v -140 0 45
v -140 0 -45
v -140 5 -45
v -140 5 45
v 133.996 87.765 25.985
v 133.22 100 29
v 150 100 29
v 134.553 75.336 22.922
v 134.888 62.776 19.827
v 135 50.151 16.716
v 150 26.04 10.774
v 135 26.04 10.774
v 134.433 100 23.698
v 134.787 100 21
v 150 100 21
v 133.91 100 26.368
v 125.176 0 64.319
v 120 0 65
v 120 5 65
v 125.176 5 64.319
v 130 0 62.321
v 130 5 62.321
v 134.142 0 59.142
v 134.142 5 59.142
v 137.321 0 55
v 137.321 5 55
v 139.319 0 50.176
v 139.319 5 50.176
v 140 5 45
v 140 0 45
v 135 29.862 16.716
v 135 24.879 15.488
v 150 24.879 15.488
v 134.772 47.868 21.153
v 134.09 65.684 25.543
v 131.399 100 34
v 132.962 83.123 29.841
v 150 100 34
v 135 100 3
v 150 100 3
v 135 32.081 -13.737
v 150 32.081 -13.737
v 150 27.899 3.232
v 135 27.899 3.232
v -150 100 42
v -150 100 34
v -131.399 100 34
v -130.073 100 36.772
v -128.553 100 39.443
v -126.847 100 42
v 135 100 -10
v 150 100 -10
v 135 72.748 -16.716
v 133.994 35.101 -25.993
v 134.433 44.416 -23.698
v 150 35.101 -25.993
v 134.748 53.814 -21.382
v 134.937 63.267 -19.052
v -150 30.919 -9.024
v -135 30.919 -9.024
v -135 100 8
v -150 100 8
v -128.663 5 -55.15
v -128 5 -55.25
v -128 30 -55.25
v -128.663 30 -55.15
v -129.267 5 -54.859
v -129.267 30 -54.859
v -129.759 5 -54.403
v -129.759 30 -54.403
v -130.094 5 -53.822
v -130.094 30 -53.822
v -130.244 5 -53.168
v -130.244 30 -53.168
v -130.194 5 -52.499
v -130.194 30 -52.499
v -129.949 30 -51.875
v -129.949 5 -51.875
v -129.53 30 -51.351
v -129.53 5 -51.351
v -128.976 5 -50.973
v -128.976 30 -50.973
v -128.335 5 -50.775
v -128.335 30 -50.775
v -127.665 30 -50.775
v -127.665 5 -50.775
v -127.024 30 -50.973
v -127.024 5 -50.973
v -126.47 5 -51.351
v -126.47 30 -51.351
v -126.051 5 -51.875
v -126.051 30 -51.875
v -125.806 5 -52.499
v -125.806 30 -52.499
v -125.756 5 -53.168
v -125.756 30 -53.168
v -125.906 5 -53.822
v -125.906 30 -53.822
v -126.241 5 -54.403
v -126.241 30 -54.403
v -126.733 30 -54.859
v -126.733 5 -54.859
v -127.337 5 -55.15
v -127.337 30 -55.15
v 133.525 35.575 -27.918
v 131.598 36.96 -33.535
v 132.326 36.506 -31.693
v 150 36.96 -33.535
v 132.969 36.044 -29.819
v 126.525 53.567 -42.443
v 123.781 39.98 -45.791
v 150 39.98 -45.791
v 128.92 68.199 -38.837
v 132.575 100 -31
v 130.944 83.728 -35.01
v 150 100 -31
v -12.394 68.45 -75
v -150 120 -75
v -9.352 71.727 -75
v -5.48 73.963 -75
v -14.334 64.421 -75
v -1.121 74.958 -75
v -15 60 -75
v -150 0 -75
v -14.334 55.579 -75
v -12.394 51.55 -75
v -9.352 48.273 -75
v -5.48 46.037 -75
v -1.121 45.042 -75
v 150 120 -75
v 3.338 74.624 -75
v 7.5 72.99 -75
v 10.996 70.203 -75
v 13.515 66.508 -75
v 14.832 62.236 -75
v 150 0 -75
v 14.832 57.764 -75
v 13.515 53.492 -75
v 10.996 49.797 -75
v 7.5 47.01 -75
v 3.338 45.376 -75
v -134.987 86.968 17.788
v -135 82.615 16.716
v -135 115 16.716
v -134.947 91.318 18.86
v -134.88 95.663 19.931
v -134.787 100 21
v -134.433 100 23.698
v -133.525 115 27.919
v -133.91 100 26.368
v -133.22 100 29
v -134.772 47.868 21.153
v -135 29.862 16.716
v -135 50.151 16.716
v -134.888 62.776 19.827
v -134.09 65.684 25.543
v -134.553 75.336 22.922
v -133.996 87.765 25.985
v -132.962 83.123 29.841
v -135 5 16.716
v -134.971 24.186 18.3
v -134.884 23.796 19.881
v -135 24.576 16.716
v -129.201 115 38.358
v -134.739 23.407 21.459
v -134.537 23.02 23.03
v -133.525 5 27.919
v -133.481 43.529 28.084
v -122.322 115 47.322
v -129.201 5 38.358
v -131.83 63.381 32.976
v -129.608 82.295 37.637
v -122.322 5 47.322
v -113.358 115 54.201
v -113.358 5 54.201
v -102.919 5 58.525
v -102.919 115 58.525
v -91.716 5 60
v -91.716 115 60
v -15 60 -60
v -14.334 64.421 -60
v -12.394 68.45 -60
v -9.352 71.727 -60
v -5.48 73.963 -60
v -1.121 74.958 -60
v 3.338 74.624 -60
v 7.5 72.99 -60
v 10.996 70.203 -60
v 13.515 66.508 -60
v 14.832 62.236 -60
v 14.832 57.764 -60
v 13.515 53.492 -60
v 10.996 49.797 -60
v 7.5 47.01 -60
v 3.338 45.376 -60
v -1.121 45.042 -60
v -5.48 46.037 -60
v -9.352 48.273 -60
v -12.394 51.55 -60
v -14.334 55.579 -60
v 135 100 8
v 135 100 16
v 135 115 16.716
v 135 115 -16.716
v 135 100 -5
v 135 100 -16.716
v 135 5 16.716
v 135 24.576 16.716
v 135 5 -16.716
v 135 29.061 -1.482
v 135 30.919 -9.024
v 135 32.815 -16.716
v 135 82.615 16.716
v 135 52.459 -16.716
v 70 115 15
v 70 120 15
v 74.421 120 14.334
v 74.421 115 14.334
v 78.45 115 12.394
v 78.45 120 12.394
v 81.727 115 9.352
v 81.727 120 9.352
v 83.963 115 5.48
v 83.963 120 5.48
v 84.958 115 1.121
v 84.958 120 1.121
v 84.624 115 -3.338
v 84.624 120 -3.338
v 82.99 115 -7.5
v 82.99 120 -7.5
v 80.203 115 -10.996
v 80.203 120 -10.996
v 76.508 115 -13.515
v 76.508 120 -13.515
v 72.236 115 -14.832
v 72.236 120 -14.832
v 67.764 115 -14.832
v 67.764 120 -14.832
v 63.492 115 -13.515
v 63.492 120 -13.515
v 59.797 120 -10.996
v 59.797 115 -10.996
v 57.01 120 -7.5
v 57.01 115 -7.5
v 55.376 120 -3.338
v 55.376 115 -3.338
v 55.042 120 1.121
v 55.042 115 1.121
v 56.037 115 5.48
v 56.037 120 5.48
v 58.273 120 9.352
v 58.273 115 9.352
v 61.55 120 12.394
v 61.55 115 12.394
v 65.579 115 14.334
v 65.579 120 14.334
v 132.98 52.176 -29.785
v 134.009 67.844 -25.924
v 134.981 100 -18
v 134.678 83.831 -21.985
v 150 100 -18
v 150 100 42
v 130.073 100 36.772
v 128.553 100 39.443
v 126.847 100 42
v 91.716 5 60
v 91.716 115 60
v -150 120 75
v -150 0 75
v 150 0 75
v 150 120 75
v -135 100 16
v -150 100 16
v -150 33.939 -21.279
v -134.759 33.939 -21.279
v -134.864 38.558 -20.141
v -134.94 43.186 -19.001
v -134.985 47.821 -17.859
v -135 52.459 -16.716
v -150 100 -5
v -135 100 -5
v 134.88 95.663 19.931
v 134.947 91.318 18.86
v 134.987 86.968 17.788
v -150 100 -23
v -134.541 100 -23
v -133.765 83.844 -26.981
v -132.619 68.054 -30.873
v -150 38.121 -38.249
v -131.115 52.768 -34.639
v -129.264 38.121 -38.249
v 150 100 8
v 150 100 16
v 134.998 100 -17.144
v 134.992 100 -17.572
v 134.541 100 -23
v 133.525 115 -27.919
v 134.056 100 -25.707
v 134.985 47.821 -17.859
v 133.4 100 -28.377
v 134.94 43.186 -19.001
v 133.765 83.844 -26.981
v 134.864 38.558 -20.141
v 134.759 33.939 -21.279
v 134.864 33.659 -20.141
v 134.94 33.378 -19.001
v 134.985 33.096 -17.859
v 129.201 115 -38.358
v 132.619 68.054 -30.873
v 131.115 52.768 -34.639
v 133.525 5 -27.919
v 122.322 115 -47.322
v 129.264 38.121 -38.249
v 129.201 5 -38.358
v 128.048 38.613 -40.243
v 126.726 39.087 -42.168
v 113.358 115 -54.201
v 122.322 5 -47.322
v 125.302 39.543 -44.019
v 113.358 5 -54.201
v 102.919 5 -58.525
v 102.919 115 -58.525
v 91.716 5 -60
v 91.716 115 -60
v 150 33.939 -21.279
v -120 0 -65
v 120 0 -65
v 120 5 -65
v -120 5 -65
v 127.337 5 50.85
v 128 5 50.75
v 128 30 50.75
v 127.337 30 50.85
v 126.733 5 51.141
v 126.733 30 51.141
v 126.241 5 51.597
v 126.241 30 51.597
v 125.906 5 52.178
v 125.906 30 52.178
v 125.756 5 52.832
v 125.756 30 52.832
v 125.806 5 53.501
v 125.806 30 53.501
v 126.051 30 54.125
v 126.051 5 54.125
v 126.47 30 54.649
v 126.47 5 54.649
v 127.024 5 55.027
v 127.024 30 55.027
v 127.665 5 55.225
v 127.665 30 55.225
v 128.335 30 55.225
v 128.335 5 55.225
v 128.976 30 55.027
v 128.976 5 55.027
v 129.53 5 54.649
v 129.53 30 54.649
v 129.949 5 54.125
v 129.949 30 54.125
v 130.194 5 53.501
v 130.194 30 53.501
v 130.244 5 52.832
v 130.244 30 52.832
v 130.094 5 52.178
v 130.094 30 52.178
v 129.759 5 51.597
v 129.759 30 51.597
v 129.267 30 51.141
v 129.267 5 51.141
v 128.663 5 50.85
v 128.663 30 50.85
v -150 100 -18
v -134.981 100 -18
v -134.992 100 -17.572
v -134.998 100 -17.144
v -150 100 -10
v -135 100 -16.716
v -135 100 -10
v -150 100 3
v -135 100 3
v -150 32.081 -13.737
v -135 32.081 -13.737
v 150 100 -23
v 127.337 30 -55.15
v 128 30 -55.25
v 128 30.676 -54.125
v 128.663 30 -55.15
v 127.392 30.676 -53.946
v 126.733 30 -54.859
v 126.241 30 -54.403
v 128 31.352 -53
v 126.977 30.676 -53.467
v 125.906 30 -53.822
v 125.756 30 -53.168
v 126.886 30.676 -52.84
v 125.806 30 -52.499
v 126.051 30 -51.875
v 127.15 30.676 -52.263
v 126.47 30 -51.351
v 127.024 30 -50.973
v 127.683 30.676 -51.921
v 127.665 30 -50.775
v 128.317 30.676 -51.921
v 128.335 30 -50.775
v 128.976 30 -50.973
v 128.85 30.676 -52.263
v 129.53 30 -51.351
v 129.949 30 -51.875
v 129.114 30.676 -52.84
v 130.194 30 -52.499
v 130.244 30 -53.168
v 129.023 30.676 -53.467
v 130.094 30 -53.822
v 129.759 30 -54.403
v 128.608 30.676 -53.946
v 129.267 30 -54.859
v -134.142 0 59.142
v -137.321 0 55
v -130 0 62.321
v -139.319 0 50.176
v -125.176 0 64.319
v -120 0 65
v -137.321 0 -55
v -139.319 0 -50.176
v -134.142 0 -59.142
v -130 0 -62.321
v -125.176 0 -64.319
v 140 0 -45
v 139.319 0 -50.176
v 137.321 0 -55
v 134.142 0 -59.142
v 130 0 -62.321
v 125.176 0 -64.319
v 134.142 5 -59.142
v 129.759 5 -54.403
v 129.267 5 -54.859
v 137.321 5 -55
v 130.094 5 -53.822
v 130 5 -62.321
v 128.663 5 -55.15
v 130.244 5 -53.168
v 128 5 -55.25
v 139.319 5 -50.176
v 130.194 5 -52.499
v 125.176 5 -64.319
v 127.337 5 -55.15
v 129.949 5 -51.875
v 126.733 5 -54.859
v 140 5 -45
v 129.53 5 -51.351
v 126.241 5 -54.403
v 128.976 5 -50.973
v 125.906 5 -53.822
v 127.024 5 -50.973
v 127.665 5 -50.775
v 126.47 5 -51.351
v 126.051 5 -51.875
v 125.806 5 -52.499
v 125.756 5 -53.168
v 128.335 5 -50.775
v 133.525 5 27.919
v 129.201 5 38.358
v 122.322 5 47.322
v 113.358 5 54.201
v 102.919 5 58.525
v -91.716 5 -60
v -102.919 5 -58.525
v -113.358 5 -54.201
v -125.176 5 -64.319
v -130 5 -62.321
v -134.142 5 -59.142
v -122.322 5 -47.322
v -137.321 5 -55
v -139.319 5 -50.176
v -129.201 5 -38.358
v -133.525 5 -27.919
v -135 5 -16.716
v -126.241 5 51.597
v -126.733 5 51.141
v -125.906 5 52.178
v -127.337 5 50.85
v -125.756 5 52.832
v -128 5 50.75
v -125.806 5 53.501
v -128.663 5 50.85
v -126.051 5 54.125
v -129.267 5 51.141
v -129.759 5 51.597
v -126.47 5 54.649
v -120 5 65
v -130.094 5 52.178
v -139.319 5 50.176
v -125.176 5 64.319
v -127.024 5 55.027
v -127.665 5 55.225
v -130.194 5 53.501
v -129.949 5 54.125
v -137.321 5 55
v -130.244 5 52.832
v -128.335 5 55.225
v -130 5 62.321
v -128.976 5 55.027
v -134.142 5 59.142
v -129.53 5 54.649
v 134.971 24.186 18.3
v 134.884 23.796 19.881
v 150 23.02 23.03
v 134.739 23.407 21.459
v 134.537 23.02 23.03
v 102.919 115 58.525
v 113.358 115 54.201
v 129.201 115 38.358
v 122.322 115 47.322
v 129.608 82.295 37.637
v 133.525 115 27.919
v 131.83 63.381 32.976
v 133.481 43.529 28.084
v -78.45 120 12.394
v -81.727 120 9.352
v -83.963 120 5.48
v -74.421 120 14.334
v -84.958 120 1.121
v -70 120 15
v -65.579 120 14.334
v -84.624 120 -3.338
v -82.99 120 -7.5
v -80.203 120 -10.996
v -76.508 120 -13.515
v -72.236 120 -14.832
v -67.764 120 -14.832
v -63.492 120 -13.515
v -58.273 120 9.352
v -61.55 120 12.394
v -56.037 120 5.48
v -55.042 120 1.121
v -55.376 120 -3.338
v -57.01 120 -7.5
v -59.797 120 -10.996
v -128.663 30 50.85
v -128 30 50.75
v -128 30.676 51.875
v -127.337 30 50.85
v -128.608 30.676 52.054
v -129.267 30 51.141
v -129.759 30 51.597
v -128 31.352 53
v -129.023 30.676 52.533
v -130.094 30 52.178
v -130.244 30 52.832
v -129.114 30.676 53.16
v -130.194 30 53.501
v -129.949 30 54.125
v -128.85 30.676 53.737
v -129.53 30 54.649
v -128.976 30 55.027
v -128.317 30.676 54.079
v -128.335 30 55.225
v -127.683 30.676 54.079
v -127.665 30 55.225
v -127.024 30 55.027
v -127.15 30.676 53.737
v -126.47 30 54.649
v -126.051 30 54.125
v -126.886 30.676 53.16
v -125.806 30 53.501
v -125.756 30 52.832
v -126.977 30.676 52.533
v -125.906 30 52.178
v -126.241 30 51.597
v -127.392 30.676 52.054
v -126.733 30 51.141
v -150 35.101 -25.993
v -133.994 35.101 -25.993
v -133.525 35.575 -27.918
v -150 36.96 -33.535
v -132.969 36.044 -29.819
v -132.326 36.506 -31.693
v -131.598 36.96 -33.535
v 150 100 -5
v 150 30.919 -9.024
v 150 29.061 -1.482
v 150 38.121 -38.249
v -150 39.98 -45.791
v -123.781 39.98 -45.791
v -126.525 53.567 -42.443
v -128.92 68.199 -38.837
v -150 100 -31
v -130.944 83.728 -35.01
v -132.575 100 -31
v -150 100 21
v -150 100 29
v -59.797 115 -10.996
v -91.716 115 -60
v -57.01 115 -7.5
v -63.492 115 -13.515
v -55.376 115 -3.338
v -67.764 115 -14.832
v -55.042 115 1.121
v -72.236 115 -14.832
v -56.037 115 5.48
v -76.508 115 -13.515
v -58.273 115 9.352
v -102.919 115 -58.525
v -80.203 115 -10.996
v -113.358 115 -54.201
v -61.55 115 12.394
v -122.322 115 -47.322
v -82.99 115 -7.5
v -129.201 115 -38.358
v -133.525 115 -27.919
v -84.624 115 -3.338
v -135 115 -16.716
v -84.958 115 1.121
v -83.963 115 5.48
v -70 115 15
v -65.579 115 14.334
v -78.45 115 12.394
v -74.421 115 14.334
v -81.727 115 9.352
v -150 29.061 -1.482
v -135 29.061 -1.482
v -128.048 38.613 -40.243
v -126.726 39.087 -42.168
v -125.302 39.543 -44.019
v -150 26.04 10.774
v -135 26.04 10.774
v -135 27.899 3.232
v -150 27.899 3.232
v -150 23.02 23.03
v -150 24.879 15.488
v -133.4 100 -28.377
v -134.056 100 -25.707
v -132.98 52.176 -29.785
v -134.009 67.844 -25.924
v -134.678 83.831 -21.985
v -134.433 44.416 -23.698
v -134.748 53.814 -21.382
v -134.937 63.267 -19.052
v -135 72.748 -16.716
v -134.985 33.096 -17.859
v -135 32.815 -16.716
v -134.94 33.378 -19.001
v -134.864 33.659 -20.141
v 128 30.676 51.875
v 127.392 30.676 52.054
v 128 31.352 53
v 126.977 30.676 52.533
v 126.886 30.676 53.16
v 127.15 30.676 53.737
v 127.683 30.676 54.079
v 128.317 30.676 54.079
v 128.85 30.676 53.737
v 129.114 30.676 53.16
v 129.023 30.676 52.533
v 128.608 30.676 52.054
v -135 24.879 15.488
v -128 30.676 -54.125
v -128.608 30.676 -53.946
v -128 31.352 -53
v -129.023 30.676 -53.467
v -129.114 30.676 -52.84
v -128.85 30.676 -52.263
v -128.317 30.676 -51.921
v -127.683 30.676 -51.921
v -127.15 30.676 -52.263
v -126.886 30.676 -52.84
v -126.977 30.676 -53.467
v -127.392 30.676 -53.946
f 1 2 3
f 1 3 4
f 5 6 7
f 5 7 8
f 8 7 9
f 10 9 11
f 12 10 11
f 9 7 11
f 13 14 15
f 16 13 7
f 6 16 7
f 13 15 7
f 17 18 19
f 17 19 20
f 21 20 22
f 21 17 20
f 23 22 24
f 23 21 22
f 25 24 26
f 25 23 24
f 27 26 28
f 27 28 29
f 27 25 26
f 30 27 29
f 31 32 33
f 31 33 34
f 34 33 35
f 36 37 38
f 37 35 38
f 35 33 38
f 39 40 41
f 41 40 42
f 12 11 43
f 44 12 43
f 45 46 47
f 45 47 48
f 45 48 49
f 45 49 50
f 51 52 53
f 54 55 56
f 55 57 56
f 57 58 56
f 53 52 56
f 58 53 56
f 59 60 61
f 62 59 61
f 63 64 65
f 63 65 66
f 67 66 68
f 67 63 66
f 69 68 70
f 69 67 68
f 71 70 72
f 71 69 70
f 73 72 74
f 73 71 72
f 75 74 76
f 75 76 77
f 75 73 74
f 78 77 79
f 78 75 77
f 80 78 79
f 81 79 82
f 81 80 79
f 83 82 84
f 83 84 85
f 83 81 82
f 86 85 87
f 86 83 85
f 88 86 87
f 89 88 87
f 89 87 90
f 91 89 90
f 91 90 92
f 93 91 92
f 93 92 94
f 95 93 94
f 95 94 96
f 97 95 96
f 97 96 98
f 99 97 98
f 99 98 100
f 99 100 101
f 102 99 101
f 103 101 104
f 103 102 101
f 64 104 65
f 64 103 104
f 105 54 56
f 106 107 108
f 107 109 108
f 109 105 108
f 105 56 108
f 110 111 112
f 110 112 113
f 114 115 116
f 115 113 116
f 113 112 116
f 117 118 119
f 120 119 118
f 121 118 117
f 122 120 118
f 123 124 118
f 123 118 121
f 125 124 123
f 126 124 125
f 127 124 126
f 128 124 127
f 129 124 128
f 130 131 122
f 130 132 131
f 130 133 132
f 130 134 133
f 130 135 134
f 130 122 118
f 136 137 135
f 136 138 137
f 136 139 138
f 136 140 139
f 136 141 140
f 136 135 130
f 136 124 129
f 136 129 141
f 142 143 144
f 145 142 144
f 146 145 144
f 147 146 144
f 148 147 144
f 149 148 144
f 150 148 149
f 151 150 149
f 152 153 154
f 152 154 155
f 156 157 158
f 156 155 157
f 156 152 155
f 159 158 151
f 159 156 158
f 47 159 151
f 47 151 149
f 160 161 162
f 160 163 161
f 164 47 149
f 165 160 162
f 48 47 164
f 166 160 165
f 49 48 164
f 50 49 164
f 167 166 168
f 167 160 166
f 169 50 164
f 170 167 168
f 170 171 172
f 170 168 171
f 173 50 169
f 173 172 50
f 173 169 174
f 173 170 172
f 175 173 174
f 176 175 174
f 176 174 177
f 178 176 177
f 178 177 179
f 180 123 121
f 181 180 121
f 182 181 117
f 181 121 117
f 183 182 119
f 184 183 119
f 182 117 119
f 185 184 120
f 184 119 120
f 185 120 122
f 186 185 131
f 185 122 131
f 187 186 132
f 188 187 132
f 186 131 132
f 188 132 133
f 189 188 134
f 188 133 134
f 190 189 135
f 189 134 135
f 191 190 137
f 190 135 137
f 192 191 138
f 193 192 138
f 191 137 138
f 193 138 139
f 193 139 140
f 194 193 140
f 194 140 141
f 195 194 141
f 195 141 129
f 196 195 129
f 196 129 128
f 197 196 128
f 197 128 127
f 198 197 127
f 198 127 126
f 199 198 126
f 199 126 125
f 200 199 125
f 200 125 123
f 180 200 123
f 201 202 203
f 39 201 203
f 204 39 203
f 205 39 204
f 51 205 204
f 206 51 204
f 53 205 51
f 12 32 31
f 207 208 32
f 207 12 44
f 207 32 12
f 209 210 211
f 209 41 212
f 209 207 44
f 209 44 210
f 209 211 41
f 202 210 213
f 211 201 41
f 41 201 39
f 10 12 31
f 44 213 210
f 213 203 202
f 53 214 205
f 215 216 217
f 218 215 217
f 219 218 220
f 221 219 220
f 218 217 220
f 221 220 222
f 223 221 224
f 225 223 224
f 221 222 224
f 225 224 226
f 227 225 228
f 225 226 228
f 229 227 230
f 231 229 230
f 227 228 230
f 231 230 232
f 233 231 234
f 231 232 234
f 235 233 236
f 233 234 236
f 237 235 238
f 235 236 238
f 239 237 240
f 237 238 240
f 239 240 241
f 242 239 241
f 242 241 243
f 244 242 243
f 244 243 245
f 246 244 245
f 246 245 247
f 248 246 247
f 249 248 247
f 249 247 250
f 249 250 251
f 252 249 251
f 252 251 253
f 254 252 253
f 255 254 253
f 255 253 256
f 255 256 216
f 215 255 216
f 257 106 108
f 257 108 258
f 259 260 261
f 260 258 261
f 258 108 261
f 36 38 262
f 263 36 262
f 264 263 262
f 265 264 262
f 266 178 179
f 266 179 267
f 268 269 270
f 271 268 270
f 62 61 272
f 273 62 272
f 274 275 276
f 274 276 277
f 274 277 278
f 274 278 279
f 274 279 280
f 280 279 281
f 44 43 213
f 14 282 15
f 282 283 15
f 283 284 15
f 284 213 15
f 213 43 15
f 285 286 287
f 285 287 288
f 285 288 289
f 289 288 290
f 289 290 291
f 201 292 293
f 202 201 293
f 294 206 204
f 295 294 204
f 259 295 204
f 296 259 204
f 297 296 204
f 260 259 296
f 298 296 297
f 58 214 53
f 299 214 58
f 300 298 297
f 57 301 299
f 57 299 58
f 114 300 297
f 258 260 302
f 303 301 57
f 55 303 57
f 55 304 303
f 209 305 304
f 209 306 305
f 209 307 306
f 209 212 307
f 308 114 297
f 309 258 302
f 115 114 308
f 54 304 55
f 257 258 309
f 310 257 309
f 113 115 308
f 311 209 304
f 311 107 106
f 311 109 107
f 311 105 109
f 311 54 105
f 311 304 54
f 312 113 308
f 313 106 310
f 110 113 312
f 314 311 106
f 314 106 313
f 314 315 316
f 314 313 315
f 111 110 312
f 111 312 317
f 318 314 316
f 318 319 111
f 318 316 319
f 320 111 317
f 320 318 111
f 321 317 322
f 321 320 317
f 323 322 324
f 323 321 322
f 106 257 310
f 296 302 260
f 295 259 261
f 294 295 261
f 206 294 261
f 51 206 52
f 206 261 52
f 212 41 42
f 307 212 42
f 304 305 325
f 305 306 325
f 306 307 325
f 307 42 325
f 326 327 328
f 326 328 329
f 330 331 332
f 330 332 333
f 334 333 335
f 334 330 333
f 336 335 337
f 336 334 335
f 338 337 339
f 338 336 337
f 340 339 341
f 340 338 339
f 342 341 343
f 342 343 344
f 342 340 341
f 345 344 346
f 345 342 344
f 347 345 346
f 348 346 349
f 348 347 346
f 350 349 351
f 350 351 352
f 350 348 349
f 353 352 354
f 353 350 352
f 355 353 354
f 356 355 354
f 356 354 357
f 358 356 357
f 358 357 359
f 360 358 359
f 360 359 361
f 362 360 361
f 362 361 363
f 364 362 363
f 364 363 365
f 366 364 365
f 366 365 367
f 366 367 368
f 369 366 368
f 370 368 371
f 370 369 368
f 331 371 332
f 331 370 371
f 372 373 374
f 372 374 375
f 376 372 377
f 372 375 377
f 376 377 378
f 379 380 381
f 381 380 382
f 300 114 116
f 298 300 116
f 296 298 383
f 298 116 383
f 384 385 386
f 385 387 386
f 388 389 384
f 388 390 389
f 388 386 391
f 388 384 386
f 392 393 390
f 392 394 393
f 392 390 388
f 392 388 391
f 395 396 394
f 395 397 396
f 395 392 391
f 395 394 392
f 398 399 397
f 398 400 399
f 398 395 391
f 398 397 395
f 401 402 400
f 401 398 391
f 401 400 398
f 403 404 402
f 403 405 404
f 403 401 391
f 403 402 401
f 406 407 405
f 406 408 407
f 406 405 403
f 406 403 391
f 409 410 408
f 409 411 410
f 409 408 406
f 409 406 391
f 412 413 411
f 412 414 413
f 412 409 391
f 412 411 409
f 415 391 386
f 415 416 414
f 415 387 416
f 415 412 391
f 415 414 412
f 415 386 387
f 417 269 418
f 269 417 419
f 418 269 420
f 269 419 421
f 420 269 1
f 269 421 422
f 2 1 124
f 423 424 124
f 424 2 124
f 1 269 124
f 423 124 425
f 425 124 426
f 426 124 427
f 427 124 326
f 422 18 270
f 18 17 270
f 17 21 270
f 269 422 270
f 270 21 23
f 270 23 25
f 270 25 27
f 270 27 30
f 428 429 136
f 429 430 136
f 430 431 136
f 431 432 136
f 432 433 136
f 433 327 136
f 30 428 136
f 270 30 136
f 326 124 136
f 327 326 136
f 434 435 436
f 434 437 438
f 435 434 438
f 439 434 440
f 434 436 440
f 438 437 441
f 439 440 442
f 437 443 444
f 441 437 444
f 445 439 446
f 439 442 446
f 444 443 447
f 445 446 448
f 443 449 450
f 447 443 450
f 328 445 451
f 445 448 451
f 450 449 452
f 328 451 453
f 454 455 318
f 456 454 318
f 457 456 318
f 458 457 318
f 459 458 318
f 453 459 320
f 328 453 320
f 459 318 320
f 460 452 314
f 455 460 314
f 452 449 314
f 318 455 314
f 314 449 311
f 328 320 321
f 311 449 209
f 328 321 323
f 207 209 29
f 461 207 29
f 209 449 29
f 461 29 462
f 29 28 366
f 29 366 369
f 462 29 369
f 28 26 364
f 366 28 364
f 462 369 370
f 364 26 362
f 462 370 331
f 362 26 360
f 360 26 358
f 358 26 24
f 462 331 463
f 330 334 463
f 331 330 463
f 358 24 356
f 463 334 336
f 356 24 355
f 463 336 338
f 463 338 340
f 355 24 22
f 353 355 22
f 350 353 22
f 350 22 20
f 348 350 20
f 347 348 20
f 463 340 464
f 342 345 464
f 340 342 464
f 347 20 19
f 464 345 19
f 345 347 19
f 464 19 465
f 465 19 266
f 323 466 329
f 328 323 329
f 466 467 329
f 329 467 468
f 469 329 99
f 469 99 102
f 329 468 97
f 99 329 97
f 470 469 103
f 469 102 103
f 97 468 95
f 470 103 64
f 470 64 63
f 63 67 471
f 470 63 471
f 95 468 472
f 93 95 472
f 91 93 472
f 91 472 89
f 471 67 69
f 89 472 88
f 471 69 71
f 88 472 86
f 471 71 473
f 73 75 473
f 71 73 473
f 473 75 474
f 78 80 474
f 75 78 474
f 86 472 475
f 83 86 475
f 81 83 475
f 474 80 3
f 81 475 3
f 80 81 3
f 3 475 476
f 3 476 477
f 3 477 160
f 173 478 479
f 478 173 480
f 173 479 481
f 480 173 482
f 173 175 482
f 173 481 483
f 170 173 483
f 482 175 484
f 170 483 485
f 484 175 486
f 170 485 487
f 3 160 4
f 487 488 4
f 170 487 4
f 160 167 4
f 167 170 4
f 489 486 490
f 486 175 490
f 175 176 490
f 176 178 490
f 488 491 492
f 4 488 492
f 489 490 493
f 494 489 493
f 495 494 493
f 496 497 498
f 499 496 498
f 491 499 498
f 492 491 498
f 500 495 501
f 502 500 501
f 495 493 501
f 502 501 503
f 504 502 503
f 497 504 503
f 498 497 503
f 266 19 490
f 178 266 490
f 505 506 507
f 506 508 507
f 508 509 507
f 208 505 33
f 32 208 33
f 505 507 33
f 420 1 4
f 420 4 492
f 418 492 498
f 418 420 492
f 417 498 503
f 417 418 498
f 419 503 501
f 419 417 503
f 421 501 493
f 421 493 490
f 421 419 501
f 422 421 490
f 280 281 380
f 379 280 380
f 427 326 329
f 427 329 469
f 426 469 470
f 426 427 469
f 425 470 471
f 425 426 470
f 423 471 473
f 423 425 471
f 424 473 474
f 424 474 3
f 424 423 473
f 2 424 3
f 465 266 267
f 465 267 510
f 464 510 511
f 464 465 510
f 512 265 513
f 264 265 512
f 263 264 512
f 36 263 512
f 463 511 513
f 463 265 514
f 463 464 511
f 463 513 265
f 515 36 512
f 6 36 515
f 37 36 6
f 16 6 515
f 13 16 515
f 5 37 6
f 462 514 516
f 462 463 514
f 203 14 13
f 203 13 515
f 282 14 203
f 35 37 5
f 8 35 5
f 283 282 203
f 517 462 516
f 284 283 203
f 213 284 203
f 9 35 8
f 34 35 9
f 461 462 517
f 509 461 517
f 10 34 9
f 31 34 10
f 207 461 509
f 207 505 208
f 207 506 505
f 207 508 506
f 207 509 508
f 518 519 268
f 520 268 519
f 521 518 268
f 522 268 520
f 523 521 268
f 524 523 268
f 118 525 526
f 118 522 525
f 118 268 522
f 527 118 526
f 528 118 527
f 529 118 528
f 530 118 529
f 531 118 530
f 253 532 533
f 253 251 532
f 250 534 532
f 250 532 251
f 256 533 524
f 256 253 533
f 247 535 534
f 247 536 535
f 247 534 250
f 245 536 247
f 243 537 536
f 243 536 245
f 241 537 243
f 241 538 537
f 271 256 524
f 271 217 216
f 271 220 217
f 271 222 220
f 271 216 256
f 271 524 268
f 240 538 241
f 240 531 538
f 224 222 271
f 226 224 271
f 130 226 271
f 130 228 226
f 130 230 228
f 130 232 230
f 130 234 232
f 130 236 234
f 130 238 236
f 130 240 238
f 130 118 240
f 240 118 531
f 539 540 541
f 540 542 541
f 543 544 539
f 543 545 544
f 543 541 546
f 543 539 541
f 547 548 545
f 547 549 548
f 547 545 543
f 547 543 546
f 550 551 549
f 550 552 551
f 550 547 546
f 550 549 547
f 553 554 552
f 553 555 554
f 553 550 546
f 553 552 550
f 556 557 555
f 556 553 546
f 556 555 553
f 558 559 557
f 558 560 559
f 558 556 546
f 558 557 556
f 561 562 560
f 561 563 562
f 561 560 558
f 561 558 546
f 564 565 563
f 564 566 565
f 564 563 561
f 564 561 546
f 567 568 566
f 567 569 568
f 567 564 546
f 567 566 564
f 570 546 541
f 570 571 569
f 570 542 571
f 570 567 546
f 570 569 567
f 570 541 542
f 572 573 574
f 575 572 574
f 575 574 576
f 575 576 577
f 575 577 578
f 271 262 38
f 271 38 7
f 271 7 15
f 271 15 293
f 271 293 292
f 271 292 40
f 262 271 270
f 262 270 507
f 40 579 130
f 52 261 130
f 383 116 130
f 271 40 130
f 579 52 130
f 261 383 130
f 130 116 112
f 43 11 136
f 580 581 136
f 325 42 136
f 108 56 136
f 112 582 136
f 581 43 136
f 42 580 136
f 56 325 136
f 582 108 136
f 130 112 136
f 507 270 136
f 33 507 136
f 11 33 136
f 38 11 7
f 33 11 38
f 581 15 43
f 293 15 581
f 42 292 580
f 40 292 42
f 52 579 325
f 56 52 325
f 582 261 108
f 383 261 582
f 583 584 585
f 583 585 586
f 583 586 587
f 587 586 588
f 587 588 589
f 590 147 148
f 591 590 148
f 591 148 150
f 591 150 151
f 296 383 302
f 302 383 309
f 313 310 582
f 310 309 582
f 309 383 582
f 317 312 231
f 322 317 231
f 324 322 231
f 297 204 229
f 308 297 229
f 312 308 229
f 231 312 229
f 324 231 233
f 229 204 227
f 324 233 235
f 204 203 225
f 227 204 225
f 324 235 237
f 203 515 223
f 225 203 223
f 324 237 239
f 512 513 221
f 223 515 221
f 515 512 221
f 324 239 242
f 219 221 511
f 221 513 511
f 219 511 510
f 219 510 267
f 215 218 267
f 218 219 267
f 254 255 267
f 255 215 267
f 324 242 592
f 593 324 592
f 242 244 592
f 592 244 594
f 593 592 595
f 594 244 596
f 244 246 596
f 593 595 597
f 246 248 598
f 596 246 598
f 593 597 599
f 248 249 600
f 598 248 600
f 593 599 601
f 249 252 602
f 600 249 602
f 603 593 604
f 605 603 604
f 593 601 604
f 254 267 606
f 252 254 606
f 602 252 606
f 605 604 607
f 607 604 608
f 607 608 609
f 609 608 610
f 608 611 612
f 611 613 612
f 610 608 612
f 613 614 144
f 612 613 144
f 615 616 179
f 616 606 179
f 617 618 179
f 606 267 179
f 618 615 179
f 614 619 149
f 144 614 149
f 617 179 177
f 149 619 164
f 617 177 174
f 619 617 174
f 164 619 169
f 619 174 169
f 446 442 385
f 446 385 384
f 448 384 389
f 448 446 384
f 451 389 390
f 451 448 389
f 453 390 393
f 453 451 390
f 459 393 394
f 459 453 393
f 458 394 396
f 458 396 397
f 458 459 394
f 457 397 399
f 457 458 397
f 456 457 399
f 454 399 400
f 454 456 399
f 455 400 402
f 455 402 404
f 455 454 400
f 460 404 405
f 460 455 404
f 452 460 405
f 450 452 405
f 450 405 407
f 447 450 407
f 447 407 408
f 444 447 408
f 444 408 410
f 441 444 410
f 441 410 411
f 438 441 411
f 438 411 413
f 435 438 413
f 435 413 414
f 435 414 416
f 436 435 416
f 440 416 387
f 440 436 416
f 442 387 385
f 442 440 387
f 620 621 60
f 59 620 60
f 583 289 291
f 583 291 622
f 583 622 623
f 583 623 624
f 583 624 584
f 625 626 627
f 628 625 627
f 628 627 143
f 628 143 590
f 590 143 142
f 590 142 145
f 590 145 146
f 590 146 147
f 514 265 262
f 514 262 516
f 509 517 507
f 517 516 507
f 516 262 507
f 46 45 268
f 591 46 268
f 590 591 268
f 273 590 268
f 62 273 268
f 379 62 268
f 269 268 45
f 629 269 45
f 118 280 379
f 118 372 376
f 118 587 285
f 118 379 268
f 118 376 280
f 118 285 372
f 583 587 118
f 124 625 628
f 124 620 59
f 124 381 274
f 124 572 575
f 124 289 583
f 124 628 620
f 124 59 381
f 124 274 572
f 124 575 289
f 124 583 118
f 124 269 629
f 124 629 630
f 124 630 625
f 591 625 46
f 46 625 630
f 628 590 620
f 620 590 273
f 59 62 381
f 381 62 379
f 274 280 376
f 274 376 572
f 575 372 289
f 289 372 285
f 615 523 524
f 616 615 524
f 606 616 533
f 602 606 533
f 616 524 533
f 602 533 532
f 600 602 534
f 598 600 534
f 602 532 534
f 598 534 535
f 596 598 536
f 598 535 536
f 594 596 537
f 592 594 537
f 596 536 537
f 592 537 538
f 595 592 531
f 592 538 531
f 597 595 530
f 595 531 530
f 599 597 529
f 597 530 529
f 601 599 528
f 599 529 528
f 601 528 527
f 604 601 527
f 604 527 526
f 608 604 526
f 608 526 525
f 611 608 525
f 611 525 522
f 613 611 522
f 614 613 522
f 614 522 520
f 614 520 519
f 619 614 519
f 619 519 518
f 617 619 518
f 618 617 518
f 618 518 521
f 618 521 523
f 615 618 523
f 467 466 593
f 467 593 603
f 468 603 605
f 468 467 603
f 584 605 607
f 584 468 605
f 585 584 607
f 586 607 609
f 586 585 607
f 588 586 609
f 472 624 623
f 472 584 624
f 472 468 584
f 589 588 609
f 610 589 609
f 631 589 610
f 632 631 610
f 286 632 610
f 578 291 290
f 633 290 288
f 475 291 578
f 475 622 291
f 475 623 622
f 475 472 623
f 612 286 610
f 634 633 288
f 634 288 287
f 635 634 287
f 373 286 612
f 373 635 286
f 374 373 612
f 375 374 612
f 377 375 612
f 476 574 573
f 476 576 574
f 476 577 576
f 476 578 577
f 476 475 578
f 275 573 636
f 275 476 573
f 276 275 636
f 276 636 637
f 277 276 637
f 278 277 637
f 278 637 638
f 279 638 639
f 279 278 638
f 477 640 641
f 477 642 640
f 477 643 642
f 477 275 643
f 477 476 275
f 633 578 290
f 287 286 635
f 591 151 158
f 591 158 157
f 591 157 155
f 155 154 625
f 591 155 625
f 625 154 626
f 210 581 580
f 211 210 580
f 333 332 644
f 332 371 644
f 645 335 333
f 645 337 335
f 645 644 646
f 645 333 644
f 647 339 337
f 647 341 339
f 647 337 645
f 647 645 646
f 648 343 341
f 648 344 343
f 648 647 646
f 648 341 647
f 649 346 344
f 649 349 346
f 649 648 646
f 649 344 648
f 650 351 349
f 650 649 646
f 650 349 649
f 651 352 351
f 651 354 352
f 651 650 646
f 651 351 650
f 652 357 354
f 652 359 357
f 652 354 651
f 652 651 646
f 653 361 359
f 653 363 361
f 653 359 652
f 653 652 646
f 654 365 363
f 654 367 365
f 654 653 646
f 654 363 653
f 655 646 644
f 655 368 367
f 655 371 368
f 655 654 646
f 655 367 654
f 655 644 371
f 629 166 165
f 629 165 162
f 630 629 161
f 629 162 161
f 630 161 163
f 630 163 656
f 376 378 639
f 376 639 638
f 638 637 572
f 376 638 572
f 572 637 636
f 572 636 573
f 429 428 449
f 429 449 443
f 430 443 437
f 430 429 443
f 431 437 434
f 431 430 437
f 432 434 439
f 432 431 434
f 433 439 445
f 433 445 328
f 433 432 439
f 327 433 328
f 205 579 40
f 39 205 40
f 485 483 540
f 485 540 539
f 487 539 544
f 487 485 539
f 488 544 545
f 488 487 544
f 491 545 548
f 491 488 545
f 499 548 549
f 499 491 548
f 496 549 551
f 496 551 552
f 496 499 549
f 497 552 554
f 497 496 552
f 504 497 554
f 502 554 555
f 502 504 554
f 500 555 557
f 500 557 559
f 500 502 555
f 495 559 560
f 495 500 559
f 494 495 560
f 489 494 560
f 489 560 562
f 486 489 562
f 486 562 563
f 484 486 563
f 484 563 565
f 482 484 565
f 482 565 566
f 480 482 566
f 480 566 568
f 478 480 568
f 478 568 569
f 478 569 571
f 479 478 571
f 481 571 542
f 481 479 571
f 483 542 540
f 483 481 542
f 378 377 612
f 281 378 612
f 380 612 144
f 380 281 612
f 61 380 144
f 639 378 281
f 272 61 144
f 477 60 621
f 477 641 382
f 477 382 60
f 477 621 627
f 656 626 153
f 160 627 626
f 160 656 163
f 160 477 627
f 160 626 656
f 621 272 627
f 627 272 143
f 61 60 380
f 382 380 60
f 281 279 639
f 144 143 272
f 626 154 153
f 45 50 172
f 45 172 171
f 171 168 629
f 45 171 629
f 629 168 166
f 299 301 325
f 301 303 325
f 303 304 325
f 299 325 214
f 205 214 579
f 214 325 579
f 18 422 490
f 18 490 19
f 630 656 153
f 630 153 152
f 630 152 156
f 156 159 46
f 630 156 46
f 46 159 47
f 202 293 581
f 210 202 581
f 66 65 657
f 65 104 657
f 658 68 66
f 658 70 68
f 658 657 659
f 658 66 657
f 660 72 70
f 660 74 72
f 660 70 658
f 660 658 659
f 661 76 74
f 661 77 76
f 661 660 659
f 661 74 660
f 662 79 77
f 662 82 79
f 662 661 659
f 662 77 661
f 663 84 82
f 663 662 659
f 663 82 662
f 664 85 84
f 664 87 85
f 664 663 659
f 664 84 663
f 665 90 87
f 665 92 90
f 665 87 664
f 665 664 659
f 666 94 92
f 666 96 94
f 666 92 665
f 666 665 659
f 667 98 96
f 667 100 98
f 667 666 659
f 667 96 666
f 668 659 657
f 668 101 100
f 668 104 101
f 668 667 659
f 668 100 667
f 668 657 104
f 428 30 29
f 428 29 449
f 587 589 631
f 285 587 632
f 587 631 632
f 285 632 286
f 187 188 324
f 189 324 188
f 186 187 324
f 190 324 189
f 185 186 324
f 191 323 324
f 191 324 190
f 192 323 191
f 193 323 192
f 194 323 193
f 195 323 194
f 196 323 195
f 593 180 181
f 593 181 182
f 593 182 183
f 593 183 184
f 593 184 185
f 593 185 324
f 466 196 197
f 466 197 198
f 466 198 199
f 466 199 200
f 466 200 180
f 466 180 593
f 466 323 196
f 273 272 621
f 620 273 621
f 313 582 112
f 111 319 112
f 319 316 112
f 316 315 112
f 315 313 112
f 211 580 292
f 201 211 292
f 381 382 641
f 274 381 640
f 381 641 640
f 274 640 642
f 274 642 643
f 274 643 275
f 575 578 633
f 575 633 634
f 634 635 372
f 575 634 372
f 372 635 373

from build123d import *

# Parameters (mm, degrees)
SKETCH2_W                                     = 300
SKETCH2_H                                     = 150
BOSS_EXTRUDE1_DEPTH                           = 120
CUT_EXTRUDE2_DEPTH                            = 5
CUT_EXTRUDE3_DEPTH                            = 110
CBORE_FOR_M4_PAN_HEAD_MACHINE_SCREW1_AT_COUNT = 2
CBORE_FOR_M4_PAN_HEAD_MACHINE_SCREW1_AT_PITCH = 256
CBORE_FOR_M4_PAN_HEAD_MACHINE_SCREW1_2_COUNT  = 2
CBORE_FOR_M4_PAN_HEAD_MACHINE_SCREW1_2_PITCH  = 277.077606457
CBORE_FOR_M4_PAN_HEAD_MACHINE_SCREW1_3_COUNT  = 2
CBORE_FOR_M4_PAN_HEAD_MACHINE_SCREW1_3_PITCH  = 106
CUT_EXTRUDE5_DEPTH                            = 332.700165812
SKETCH17_R                                    = 15
CUT_EXTRUDE6_DEPTH                            = 20
SKETCH3_R                                     = 15
CUT_EXTRUDE1_DEPTH                            = 50


with BuildPart() as part:
    # Sketch2 → Boss-Extrude1 (new body)
    with BuildSketch(Plane(origin=(0, 0, 0), x_dir=(1, 0, 0), z_dir=(0, 1, 0))):
        Rectangle(SKETCH2_W, SKETCH2_H)
    extrude(amount=BOSS_EXTRUDE1_DEPTH)

    # Sketch7 → Cut-Extrude2 (cut)
    with BuildSketch(Plane.XZ):
        with BuildLine():
            Line((-120, 65), (120, 65))
            ThreePointArc((120, 65), (134.142135624, 59.142135624), (140, 45))
            Line((140, 45), (140, -45))
            ThreePointArc((140, -45), (134.142135624, -59.142135624), (120, -65))
            Line((120, -65), (-120, -65))
            ThreePointArc((-120, -65), (-134.142135624, -59.142135624), (-140, -45))
            Line((-140, -45), (-140, 45))
            ThreePointArc((-140, 45), (-134.142135624, 59.142135624), (-120, 65))
        make_face()
    extrude(amount=-CUT_EXTRUDE2_DEPTH, mode=Mode.SUBTRACT)

    # Sketch8 → Cut-Extrude3 (cut)
    with BuildSketch(Plane.XZ.offset(-5)):
        with BuildLine():
            Line((-91.715728753, 60), (91.715728753, 60))
            ThreePointArc((91.715728753, 60), (122.32233047, 47.32233047), (135, 16.715728753))
            Line((135, 16.715728753), (135, -16.715728753))
            ThreePointArc((135, -16.715728753), (122.32233047, -47.32233047), (91.715728753, -60))
            Line((91.715728753, -60), (-91.715728753, -60))
            ThreePointArc((-91.715728753, -60), (-122.32233047, -47.32233047), (-135, -16.715728753))
            Line((-135, -16.715728753), (-135, 16.715728753))
            ThreePointArc((-135, 16.715728753), (-122.32233047, 47.32233047), (-91.715728753, 60))
        make_face()
    extrude(amount=-CUT_EXTRUDE3_DEPTH, mode=Mode.SUBTRACT)

    # Sketch14 → CBORE for M4 Pan Head Machine Screw1 (revolve, cut)
    with BuildSketch(Plane(origin=(128, 0, -53), x_dir=(0, 0, -1), z_dir=(1, 0, 0))):
        Polygon((0, 0), (0, 31.351936393), (2.25, 30), (2.25, 3.1), (4.5, 3.1), (4.5, 0.025), (4.525, 0), align=None)
    cbore_for_m4_pan_head_machine_screw1 = revolve(axis=Axis((128, -6.35, -53), (0, 1, 0)), mode=Mode.SUBTRACT)

    # CBORE for M4 Pan Head Machine Screw1 at: CBORE for M4 Pan Head Machine Screw1 ×2
    with Locations(*[(-i * CBORE_FOR_M4_PAN_HEAD_MACHINE_SCREW1_AT_PITCH, 0, 0) for i in range(1, CBORE_FOR_M4_PAN_HEAD_MACHINE_SCREW1_AT_COUNT)]):
        add(cbore_for_m4_pan_head_machine_screw1, mode=Mode.SUBTRACT)

    # CBORE for M4 Pan Head Machine Screw1 2: CBORE for M4 Pan Head Machine Screw1 ×2
    with Locations(*[Vector(-0.9239288705910962, 0, 0.38256429797912606) * (i * CBORE_FOR_M4_PAN_HEAD_MACHINE_SCREW1_2_PITCH) for i in range(1, CBORE_FOR_M4_PAN_HEAD_MACHINE_SCREW1_2_COUNT)]):
        add(cbore_for_m4_pan_head_machine_screw1, mode=Mode.SUBTRACT)

    # CBORE for M4 Pan Head Machine Screw1 3: CBORE for M4 Pan Head Machine Screw1 ×2
    with Locations(*[(0, 0, i * CBORE_FOR_M4_PAN_HEAD_MACHINE_SCREW1_3_PITCH) for i in range(1, CBORE_FOR_M4_PAN_HEAD_MACHINE_SCREW1_3_COUNT)]):
        add(cbore_for_m4_pan_head_machine_screw1, mode=Mode.SUBTRACT)

    # Sketch15 → Cut-Extrude5 (cut, through all)
    with BuildSketch(Plane(origin=(150, 0, 0), x_dir=(0, 0, -1), z_dir=(1, 0, 0))):
        Polygon((-42, 100), (-23.029720743, 23.02020202), (-15.487735621, 24.878787879), (-34, 100), align=None)
        Polygon((-29, 100), (-10.773994919, 26.04040404), (-3.232009797, 27.898989899), (-21, 100), align=None)
        Polygon((-16, 100), (1.481730904, 29.060606061), (9.023716027, 30.919191919), (-8, 100), align=None)
        Polygon((-3, 100), (13.737456728, 32.080808081), (21.27944185, 33.939393939), (5, 100), align=None)
        Polygon((10, 100), (25.993182552, 35.101010101), (33.535167674, 36.95959596), (18, 100), align=None)
        Polygon((23, 100), (38.248908375, 38.121212121), (45.790893498, 39.97979798), (31, 100), align=None)
    extrude(amount=-CUT_EXTRUDE5_DEPTH, mode=Mode.SUBTRACT)

    # Sketch17 → Cut-Extrude6 (cut)
    with BuildSketch(Plane(origin=(0, 0, -75), x_dir=(-1, 0, 0), z_dir=(0, 0, -1))):
        with Locations((0, 60)):
            Circle(SKETCH17_R)
    extrude(amount=-CUT_EXTRUDE6_DEPTH, mode=Mode.SUBTRACT)

    # Sketch3 → Cut-Extrude1 (cut)
    with BuildSketch(Plane(origin=(0, 120, 0), x_dir=(1, 0, 0), z_dir=(0, 1, 0))):
        with Locations(Location((-70, 0, 0), (0, 0, 270))):
            Circle(SKETCH3_R)
        with Locations(Location((70, 0, 0), (0, 0, 270))):
            Circle(SKETCH3_R)
    extrude(amount=-CUT_EXTRUDE1_DEPTH, mode=Mode.SUBTRACT)


solid = part.part
